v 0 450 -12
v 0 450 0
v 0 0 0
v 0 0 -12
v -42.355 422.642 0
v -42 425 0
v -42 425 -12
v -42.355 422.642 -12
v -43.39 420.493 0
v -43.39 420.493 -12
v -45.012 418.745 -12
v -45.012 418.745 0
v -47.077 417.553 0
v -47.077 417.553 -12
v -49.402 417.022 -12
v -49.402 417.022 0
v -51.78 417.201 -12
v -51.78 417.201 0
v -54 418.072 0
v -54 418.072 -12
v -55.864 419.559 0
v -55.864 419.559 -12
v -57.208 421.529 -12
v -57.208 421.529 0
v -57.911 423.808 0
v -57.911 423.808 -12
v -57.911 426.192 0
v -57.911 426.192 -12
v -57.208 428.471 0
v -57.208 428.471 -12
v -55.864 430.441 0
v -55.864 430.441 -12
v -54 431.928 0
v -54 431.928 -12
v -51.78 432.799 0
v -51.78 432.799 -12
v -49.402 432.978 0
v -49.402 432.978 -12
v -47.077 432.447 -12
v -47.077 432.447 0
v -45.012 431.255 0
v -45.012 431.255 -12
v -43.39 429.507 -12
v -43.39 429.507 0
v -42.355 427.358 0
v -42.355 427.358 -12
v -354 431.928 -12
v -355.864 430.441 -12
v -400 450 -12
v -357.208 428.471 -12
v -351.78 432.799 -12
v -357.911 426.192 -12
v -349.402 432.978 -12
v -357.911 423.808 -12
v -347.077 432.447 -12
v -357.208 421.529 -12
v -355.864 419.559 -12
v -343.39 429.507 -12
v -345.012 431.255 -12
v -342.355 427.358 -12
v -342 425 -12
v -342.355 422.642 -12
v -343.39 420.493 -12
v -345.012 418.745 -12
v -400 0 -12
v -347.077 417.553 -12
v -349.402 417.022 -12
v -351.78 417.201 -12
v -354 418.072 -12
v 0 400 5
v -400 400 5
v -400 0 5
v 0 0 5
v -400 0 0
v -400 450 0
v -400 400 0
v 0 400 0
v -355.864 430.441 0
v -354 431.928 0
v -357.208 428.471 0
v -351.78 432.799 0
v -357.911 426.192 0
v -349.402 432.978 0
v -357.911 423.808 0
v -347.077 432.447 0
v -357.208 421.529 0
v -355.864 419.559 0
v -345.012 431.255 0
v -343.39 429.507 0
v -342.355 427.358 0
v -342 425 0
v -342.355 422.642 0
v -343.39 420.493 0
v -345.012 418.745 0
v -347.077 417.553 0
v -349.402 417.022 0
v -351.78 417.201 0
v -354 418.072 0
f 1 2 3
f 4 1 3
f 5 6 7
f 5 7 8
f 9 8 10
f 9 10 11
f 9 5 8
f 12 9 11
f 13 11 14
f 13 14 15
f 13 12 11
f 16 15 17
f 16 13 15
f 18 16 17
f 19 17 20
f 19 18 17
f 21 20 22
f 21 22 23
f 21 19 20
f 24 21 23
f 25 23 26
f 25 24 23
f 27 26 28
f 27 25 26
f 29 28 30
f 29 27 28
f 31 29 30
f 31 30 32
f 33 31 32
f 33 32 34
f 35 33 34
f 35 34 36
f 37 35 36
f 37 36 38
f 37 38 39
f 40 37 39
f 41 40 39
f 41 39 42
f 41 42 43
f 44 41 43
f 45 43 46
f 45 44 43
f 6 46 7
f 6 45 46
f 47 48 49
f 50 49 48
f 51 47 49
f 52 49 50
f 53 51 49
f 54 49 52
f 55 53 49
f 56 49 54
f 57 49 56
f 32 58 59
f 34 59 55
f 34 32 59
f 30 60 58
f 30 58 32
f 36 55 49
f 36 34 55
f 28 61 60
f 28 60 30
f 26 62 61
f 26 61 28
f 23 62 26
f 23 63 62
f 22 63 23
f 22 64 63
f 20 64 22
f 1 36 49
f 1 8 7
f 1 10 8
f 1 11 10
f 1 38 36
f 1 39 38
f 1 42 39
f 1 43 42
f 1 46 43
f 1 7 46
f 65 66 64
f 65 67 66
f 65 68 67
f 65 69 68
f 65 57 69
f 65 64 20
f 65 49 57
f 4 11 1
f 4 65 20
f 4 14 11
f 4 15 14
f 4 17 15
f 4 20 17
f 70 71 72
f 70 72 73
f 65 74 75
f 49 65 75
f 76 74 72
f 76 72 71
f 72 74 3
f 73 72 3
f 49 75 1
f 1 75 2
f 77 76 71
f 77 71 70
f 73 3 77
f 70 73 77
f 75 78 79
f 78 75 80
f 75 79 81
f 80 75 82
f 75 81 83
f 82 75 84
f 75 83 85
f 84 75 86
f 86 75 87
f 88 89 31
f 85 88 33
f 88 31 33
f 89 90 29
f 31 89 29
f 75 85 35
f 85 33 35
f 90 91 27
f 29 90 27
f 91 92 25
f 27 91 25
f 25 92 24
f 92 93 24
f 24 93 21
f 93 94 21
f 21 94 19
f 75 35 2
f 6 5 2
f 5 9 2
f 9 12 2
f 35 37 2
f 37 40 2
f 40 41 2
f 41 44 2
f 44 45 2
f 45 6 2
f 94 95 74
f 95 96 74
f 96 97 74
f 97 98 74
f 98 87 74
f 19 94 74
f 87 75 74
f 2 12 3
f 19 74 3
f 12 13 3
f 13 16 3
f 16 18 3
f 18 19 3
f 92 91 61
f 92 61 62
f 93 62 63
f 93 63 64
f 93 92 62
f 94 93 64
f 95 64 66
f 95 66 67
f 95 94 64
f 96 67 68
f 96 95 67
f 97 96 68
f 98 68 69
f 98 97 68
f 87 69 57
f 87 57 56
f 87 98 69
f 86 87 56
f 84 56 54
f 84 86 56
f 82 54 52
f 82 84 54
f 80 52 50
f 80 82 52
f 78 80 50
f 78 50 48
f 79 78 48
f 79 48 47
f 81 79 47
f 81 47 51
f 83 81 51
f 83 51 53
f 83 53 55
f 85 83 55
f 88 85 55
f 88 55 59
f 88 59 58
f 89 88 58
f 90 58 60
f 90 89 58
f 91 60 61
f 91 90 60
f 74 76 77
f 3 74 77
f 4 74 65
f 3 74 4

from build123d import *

# Parameters (mm, degrees)
F0_W     = 400
F0_H     = 400
F1_DEPTH = 5
F2_W     = 400
F2_H     = 50
F2_R     = 8
F2_H_2   = 400
F3_DEPTH = 12


with BuildPart() as f1:
    # F0 (on Top) → F1 (new body)
    with BuildSketch(Plane.XY):
        with Locations((-200, 200)):
            Rectangle(F0_W, F0_H)
    extrude(amount=F1_DEPTH)


with BuildPart() as f3:
    # F2 (on face) → F3 (new body)
    with BuildSketch(Plane(origin=(0, 0, 0), x_dir=(1, 0, 0), z_dir=(0, 0, -1))):
        with Locations((-200, -425)):
            Rectangle(F2_W, F2_H)
        with Locations((-350, -425)):
            Circle(F2_R, mode=Mode.SUBTRACT)
        with Locations((-50, -425)):
            Circle(F2_R, mode=Mode.SUBTRACT)
        with Locations((-200, -200)):
            Rectangle(F2_W, F2_H_2)
    extrude(amount=F3_DEPTH)


solid = Compound([f1.part, f3.part])
